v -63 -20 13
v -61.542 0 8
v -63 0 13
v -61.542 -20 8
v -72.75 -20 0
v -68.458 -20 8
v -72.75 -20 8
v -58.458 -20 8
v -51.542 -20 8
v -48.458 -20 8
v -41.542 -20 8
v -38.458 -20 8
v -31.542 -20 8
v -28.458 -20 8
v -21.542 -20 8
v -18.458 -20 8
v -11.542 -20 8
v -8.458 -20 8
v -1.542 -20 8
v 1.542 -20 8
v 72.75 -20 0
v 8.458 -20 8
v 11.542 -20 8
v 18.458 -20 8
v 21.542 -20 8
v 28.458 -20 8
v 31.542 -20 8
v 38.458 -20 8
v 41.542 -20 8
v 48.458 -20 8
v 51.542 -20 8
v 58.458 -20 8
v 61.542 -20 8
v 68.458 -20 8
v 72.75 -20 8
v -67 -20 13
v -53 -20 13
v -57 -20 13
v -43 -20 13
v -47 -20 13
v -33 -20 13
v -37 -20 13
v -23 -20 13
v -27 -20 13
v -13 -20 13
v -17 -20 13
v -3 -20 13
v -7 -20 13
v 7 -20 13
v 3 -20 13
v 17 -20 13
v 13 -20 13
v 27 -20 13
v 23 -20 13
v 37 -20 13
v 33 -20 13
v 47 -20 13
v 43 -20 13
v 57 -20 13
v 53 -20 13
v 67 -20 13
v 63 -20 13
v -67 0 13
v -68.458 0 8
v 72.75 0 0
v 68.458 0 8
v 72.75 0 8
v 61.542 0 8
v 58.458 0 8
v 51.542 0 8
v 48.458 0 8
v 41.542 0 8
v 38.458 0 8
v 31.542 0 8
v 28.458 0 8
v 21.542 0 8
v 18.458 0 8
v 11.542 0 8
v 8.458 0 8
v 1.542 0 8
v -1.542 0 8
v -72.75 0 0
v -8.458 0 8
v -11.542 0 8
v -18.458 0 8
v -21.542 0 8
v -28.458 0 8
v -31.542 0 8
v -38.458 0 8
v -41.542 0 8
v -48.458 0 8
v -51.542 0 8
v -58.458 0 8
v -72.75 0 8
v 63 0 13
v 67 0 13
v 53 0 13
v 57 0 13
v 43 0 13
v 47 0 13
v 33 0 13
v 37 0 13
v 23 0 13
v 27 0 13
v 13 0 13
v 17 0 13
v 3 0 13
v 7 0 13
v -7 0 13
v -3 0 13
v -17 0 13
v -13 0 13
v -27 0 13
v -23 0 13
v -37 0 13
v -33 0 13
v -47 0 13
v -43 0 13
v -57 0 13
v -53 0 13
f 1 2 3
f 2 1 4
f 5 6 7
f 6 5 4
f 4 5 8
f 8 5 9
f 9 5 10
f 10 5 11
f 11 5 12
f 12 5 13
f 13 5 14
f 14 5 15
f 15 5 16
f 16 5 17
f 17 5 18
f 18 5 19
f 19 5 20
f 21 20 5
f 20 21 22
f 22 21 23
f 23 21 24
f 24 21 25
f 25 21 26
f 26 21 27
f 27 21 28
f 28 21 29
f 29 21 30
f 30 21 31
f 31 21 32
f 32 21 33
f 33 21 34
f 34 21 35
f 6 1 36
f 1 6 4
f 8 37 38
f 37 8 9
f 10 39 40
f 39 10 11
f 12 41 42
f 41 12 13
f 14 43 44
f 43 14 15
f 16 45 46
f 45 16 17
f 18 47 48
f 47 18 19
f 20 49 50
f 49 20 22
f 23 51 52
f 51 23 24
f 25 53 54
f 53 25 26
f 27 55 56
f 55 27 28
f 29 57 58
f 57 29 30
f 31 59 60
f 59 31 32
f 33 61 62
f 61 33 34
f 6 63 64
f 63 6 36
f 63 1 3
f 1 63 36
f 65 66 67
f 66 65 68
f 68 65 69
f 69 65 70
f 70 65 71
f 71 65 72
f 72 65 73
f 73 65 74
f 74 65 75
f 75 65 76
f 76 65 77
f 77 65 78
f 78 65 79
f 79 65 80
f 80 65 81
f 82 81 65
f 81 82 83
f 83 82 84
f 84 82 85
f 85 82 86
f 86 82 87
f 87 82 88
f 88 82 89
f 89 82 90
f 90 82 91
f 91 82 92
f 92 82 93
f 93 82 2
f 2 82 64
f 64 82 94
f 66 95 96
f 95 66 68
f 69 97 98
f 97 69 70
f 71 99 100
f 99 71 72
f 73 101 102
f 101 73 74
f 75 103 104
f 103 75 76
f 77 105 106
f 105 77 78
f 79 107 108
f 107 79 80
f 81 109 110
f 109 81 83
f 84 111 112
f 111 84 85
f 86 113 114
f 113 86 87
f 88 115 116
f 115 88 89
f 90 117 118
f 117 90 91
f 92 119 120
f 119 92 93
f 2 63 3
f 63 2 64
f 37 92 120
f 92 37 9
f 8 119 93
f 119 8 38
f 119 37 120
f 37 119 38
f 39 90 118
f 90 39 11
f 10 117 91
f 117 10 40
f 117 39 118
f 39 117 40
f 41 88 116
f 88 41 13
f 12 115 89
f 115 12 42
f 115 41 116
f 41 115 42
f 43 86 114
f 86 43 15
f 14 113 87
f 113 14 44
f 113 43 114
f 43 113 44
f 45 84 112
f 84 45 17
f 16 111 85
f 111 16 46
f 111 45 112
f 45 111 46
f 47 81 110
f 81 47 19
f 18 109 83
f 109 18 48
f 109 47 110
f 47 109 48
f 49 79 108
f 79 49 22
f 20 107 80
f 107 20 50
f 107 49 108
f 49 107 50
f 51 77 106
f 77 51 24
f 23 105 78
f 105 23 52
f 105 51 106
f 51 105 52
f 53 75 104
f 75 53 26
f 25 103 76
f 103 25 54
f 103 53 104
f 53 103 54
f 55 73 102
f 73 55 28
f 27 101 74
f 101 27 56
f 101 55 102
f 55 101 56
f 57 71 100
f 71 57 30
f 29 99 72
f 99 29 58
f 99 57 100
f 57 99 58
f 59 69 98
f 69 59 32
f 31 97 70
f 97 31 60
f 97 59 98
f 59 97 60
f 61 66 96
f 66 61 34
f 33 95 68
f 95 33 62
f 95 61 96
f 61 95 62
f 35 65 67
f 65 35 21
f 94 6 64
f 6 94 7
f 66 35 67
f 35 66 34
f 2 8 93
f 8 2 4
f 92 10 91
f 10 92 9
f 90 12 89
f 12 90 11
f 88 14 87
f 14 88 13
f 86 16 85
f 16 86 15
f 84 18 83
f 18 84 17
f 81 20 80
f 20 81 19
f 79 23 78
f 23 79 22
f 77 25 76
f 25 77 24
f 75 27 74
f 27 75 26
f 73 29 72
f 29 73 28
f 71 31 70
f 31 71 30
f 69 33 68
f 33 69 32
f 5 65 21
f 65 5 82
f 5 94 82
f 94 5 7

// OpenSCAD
$fn = 32;

// ----------------------------------------------------------------------
// Toothed rack, 14 teeth
// 10 mm pitch, 5 mm teeth
// ----------------------------------------------------------------------

// --- parameters (mm) ---
bar_w = 20;    // bar width (Y)
bar_h = 8;     // bar height (Z)
teeth = 14;    // number of teeth
pitch = 10;    // tooth pitch
tooth_h = 5;   // tooth height above the bar
root_w = 7.5;  // tooth width at the root
crest_w = 4;   // tooth width at the crest

// --- derived feature positions (mm) ---
span = (teeth - 1) * pitch;  // = 130   distance between the outer teeth
bar_l = span + root_w + 8;   // = 145.5   bar length: teeth plus 4 mm at each end
tooth_x = -span / 2;         // = -65   X of the first tooth
height = bar_h + tooth_h;    // = 13   overall height
feature_centers = [
  [tooth_x + 0 * pitch, -bar_w / 2],
  [tooth_x + 1 * pitch, -bar_w / 2],
  [tooth_x + 2 * pitch, -bar_w / 2],
  [tooth_x + 3 * pitch, -bar_w / 2],
  [tooth_x + 4 * pitch, -bar_w / 2],
  [tooth_x + 5 * pitch, -bar_w / 2],
  [tooth_x + 6 * pitch, -bar_w / 2],
  [tooth_x + 7 * pitch, -bar_w / 2],
  [tooth_x + 8 * pitch, -bar_w / 2],
  [tooth_x + 9 * pitch, -bar_w / 2],
  [tooth_x + 10 * pitch, -bar_w / 2],
  [tooth_x + 11 * pitch, -bar_w / 2],
  [tooth_x + 12 * pitch, -bar_w / 2],
  [tooth_x + 13 * pitch, -bar_w / 2]
];   // tooth centre line, drives the tooth loop

// bar with a rack of teeth, one extruded trapezoium per centre
module rack_tooth() {
  linear_extrude(height = bar_w)
    polygon(points = [
      [0, 0],
      [root_w, 0],
      [root_w / 2 + crest_w / 2, tooth_h + 1],
      [root_w / 2 - crest_w / 2, tooth_h + 1]
    ]);
}

union() {
  translate([-bar_l / 2, -bar_w, 0]) cube([bar_l, bar_w, bar_h]);
  for (centre = feature_centers)
    translate([centre[0] - root_w / 2, 0, bar_h - 1]) rotate([90, 0, 0]) rack_tooth();
}
